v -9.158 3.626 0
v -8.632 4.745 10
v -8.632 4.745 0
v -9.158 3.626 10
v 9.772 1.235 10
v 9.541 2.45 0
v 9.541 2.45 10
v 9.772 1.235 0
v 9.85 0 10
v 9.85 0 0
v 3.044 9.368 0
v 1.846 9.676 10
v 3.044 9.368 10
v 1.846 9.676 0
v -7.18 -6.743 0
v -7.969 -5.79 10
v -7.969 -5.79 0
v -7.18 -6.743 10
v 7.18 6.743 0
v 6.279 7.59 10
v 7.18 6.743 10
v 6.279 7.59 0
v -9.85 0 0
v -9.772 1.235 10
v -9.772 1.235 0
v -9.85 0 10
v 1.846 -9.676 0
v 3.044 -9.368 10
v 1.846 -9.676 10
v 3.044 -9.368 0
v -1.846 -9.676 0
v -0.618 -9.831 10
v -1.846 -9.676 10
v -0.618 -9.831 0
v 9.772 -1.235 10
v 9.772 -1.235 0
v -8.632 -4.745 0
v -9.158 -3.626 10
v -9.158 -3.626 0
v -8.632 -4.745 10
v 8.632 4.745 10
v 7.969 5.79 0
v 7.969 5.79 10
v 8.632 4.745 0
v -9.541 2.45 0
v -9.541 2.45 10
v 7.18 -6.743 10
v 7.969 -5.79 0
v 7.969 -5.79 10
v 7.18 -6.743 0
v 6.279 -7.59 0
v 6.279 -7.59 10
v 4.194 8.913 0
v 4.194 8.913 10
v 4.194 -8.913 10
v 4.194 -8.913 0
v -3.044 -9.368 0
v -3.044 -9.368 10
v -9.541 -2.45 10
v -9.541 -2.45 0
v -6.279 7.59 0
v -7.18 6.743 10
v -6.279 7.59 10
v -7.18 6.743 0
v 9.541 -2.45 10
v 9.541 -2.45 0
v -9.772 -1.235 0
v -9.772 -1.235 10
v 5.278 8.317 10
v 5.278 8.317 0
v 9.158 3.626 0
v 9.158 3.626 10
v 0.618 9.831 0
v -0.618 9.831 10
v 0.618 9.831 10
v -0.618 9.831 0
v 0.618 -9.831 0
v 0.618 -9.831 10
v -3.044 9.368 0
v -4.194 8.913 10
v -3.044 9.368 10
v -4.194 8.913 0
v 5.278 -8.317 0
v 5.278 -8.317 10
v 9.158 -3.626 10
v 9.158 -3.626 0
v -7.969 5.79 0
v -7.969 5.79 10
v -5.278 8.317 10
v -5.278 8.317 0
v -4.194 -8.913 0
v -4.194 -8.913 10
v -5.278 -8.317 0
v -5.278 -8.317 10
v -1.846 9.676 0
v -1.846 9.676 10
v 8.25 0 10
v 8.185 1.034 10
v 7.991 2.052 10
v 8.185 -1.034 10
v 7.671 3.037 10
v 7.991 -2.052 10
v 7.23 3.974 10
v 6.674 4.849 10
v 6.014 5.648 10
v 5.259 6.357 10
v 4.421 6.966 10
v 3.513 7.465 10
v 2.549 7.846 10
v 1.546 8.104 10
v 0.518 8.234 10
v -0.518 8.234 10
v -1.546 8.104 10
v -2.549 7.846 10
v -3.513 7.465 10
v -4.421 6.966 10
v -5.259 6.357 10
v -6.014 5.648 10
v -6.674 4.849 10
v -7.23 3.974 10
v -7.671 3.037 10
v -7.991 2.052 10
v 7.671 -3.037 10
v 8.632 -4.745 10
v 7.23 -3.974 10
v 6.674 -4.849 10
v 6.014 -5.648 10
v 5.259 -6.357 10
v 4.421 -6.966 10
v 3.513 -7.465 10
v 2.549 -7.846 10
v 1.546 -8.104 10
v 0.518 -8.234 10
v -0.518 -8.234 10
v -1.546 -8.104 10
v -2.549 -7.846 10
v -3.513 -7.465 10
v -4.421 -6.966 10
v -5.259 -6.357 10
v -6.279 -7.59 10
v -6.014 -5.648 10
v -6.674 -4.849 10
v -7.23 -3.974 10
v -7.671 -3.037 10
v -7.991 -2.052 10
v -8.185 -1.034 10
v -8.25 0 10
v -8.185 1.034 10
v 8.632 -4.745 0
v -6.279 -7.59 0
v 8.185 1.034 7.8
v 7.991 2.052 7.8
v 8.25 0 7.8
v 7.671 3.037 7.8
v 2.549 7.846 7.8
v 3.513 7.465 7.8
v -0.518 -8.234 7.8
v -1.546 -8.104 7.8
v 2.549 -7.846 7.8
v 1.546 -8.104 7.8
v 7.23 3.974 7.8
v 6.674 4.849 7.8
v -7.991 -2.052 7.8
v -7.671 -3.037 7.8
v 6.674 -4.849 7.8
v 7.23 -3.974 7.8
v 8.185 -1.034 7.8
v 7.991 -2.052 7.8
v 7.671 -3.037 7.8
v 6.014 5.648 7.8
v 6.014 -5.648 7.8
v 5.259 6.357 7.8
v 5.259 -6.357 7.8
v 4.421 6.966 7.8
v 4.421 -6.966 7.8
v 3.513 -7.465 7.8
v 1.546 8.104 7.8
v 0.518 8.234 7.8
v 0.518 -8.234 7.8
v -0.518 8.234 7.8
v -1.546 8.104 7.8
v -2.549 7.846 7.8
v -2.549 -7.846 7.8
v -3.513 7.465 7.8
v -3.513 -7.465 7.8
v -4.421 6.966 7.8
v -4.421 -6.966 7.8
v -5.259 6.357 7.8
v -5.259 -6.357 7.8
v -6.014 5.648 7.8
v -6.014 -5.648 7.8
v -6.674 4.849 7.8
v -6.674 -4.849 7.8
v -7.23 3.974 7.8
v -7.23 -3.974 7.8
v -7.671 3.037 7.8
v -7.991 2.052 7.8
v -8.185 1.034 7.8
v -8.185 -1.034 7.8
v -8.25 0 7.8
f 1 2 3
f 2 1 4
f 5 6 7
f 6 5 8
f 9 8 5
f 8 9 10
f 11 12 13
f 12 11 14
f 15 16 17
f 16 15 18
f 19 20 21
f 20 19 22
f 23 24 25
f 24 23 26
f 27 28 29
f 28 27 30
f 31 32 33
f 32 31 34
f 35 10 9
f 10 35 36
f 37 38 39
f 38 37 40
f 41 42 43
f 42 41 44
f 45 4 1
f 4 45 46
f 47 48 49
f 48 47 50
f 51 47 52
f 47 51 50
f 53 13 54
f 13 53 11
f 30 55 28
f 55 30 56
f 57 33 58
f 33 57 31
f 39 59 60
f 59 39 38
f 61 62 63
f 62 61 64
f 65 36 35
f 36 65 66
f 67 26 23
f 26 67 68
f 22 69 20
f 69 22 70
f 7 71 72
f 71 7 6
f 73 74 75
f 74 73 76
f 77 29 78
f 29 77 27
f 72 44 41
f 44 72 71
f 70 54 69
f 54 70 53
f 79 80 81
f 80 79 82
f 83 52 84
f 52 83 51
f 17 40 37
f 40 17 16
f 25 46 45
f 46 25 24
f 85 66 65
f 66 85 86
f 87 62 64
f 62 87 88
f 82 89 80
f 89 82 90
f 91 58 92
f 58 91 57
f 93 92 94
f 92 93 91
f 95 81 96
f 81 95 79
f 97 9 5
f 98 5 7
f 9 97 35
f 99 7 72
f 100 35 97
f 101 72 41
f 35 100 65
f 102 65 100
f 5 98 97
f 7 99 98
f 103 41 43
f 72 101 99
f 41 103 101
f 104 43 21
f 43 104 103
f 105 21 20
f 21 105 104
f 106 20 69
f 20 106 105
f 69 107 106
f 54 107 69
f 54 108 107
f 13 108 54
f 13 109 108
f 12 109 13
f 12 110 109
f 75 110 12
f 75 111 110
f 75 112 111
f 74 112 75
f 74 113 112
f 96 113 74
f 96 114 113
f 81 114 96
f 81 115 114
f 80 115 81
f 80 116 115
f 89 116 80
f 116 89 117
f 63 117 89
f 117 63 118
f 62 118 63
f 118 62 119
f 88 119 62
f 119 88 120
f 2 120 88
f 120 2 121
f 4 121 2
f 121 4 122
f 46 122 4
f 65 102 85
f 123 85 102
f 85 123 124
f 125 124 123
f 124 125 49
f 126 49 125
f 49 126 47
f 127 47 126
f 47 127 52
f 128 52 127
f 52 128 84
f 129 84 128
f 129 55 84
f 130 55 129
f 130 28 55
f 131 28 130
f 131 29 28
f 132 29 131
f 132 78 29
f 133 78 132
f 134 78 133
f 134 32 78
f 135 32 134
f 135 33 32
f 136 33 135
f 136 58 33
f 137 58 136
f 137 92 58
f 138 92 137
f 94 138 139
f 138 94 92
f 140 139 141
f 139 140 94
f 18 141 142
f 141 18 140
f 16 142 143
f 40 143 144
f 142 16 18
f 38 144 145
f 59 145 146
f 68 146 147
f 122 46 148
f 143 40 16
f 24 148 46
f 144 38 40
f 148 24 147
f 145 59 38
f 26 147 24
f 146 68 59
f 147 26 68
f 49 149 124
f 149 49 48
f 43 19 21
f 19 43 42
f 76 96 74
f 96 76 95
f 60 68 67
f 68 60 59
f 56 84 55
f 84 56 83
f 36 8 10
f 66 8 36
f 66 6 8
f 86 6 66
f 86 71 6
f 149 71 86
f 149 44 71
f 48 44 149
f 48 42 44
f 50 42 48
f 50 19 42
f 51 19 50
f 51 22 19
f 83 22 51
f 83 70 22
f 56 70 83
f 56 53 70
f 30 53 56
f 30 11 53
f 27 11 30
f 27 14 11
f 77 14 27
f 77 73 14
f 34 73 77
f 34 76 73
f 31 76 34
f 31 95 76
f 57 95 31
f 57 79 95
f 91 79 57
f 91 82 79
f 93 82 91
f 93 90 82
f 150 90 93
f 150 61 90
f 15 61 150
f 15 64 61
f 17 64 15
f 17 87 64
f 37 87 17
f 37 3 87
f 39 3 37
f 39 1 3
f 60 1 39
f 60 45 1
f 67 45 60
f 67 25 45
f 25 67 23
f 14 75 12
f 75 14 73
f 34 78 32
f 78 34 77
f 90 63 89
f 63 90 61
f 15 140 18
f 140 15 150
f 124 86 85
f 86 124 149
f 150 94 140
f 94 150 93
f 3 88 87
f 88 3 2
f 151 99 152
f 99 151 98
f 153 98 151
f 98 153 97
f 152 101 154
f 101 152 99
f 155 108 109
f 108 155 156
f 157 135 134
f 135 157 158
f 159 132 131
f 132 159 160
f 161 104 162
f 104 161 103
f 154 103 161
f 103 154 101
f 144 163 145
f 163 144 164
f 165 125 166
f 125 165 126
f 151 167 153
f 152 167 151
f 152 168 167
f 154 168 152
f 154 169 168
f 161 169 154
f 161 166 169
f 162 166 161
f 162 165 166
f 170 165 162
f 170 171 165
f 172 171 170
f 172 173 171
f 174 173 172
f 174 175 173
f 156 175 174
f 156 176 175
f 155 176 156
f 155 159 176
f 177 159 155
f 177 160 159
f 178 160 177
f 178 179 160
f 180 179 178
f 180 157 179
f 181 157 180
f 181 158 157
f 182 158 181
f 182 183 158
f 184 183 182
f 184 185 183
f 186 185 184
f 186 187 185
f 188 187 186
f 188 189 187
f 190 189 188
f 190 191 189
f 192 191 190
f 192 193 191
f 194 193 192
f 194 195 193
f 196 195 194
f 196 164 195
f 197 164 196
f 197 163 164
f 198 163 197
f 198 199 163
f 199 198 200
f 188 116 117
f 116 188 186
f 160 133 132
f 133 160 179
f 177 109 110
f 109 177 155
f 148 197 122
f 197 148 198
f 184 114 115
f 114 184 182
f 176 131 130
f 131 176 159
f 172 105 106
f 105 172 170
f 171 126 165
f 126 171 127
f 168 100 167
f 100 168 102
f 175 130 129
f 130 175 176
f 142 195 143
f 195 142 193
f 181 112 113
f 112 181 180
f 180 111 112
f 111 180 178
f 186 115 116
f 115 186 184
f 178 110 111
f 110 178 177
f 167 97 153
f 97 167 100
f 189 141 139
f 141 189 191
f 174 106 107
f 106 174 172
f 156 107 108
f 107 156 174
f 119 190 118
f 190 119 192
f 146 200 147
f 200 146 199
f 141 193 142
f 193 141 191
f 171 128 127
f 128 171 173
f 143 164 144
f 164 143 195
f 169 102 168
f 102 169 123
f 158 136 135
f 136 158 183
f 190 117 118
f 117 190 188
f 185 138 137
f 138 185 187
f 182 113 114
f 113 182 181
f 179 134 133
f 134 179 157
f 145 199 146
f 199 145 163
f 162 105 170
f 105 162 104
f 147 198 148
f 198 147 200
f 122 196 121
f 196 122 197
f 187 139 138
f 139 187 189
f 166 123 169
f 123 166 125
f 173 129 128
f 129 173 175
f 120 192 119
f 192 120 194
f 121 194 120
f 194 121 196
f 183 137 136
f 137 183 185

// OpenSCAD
wall_thickness = 4 * 0.4;
inner_diameter = 16.5;
outer_diameter = inner_diameter + 2*wall_thickness;
height = 10;


$fn=50;

difference() {
    cylinder(d = outer_diameter, h = height, center = false);
    translate([0,0,height-2.2])
      cylinder(d = inner_diameter, h = 2*height, center = false);
}
